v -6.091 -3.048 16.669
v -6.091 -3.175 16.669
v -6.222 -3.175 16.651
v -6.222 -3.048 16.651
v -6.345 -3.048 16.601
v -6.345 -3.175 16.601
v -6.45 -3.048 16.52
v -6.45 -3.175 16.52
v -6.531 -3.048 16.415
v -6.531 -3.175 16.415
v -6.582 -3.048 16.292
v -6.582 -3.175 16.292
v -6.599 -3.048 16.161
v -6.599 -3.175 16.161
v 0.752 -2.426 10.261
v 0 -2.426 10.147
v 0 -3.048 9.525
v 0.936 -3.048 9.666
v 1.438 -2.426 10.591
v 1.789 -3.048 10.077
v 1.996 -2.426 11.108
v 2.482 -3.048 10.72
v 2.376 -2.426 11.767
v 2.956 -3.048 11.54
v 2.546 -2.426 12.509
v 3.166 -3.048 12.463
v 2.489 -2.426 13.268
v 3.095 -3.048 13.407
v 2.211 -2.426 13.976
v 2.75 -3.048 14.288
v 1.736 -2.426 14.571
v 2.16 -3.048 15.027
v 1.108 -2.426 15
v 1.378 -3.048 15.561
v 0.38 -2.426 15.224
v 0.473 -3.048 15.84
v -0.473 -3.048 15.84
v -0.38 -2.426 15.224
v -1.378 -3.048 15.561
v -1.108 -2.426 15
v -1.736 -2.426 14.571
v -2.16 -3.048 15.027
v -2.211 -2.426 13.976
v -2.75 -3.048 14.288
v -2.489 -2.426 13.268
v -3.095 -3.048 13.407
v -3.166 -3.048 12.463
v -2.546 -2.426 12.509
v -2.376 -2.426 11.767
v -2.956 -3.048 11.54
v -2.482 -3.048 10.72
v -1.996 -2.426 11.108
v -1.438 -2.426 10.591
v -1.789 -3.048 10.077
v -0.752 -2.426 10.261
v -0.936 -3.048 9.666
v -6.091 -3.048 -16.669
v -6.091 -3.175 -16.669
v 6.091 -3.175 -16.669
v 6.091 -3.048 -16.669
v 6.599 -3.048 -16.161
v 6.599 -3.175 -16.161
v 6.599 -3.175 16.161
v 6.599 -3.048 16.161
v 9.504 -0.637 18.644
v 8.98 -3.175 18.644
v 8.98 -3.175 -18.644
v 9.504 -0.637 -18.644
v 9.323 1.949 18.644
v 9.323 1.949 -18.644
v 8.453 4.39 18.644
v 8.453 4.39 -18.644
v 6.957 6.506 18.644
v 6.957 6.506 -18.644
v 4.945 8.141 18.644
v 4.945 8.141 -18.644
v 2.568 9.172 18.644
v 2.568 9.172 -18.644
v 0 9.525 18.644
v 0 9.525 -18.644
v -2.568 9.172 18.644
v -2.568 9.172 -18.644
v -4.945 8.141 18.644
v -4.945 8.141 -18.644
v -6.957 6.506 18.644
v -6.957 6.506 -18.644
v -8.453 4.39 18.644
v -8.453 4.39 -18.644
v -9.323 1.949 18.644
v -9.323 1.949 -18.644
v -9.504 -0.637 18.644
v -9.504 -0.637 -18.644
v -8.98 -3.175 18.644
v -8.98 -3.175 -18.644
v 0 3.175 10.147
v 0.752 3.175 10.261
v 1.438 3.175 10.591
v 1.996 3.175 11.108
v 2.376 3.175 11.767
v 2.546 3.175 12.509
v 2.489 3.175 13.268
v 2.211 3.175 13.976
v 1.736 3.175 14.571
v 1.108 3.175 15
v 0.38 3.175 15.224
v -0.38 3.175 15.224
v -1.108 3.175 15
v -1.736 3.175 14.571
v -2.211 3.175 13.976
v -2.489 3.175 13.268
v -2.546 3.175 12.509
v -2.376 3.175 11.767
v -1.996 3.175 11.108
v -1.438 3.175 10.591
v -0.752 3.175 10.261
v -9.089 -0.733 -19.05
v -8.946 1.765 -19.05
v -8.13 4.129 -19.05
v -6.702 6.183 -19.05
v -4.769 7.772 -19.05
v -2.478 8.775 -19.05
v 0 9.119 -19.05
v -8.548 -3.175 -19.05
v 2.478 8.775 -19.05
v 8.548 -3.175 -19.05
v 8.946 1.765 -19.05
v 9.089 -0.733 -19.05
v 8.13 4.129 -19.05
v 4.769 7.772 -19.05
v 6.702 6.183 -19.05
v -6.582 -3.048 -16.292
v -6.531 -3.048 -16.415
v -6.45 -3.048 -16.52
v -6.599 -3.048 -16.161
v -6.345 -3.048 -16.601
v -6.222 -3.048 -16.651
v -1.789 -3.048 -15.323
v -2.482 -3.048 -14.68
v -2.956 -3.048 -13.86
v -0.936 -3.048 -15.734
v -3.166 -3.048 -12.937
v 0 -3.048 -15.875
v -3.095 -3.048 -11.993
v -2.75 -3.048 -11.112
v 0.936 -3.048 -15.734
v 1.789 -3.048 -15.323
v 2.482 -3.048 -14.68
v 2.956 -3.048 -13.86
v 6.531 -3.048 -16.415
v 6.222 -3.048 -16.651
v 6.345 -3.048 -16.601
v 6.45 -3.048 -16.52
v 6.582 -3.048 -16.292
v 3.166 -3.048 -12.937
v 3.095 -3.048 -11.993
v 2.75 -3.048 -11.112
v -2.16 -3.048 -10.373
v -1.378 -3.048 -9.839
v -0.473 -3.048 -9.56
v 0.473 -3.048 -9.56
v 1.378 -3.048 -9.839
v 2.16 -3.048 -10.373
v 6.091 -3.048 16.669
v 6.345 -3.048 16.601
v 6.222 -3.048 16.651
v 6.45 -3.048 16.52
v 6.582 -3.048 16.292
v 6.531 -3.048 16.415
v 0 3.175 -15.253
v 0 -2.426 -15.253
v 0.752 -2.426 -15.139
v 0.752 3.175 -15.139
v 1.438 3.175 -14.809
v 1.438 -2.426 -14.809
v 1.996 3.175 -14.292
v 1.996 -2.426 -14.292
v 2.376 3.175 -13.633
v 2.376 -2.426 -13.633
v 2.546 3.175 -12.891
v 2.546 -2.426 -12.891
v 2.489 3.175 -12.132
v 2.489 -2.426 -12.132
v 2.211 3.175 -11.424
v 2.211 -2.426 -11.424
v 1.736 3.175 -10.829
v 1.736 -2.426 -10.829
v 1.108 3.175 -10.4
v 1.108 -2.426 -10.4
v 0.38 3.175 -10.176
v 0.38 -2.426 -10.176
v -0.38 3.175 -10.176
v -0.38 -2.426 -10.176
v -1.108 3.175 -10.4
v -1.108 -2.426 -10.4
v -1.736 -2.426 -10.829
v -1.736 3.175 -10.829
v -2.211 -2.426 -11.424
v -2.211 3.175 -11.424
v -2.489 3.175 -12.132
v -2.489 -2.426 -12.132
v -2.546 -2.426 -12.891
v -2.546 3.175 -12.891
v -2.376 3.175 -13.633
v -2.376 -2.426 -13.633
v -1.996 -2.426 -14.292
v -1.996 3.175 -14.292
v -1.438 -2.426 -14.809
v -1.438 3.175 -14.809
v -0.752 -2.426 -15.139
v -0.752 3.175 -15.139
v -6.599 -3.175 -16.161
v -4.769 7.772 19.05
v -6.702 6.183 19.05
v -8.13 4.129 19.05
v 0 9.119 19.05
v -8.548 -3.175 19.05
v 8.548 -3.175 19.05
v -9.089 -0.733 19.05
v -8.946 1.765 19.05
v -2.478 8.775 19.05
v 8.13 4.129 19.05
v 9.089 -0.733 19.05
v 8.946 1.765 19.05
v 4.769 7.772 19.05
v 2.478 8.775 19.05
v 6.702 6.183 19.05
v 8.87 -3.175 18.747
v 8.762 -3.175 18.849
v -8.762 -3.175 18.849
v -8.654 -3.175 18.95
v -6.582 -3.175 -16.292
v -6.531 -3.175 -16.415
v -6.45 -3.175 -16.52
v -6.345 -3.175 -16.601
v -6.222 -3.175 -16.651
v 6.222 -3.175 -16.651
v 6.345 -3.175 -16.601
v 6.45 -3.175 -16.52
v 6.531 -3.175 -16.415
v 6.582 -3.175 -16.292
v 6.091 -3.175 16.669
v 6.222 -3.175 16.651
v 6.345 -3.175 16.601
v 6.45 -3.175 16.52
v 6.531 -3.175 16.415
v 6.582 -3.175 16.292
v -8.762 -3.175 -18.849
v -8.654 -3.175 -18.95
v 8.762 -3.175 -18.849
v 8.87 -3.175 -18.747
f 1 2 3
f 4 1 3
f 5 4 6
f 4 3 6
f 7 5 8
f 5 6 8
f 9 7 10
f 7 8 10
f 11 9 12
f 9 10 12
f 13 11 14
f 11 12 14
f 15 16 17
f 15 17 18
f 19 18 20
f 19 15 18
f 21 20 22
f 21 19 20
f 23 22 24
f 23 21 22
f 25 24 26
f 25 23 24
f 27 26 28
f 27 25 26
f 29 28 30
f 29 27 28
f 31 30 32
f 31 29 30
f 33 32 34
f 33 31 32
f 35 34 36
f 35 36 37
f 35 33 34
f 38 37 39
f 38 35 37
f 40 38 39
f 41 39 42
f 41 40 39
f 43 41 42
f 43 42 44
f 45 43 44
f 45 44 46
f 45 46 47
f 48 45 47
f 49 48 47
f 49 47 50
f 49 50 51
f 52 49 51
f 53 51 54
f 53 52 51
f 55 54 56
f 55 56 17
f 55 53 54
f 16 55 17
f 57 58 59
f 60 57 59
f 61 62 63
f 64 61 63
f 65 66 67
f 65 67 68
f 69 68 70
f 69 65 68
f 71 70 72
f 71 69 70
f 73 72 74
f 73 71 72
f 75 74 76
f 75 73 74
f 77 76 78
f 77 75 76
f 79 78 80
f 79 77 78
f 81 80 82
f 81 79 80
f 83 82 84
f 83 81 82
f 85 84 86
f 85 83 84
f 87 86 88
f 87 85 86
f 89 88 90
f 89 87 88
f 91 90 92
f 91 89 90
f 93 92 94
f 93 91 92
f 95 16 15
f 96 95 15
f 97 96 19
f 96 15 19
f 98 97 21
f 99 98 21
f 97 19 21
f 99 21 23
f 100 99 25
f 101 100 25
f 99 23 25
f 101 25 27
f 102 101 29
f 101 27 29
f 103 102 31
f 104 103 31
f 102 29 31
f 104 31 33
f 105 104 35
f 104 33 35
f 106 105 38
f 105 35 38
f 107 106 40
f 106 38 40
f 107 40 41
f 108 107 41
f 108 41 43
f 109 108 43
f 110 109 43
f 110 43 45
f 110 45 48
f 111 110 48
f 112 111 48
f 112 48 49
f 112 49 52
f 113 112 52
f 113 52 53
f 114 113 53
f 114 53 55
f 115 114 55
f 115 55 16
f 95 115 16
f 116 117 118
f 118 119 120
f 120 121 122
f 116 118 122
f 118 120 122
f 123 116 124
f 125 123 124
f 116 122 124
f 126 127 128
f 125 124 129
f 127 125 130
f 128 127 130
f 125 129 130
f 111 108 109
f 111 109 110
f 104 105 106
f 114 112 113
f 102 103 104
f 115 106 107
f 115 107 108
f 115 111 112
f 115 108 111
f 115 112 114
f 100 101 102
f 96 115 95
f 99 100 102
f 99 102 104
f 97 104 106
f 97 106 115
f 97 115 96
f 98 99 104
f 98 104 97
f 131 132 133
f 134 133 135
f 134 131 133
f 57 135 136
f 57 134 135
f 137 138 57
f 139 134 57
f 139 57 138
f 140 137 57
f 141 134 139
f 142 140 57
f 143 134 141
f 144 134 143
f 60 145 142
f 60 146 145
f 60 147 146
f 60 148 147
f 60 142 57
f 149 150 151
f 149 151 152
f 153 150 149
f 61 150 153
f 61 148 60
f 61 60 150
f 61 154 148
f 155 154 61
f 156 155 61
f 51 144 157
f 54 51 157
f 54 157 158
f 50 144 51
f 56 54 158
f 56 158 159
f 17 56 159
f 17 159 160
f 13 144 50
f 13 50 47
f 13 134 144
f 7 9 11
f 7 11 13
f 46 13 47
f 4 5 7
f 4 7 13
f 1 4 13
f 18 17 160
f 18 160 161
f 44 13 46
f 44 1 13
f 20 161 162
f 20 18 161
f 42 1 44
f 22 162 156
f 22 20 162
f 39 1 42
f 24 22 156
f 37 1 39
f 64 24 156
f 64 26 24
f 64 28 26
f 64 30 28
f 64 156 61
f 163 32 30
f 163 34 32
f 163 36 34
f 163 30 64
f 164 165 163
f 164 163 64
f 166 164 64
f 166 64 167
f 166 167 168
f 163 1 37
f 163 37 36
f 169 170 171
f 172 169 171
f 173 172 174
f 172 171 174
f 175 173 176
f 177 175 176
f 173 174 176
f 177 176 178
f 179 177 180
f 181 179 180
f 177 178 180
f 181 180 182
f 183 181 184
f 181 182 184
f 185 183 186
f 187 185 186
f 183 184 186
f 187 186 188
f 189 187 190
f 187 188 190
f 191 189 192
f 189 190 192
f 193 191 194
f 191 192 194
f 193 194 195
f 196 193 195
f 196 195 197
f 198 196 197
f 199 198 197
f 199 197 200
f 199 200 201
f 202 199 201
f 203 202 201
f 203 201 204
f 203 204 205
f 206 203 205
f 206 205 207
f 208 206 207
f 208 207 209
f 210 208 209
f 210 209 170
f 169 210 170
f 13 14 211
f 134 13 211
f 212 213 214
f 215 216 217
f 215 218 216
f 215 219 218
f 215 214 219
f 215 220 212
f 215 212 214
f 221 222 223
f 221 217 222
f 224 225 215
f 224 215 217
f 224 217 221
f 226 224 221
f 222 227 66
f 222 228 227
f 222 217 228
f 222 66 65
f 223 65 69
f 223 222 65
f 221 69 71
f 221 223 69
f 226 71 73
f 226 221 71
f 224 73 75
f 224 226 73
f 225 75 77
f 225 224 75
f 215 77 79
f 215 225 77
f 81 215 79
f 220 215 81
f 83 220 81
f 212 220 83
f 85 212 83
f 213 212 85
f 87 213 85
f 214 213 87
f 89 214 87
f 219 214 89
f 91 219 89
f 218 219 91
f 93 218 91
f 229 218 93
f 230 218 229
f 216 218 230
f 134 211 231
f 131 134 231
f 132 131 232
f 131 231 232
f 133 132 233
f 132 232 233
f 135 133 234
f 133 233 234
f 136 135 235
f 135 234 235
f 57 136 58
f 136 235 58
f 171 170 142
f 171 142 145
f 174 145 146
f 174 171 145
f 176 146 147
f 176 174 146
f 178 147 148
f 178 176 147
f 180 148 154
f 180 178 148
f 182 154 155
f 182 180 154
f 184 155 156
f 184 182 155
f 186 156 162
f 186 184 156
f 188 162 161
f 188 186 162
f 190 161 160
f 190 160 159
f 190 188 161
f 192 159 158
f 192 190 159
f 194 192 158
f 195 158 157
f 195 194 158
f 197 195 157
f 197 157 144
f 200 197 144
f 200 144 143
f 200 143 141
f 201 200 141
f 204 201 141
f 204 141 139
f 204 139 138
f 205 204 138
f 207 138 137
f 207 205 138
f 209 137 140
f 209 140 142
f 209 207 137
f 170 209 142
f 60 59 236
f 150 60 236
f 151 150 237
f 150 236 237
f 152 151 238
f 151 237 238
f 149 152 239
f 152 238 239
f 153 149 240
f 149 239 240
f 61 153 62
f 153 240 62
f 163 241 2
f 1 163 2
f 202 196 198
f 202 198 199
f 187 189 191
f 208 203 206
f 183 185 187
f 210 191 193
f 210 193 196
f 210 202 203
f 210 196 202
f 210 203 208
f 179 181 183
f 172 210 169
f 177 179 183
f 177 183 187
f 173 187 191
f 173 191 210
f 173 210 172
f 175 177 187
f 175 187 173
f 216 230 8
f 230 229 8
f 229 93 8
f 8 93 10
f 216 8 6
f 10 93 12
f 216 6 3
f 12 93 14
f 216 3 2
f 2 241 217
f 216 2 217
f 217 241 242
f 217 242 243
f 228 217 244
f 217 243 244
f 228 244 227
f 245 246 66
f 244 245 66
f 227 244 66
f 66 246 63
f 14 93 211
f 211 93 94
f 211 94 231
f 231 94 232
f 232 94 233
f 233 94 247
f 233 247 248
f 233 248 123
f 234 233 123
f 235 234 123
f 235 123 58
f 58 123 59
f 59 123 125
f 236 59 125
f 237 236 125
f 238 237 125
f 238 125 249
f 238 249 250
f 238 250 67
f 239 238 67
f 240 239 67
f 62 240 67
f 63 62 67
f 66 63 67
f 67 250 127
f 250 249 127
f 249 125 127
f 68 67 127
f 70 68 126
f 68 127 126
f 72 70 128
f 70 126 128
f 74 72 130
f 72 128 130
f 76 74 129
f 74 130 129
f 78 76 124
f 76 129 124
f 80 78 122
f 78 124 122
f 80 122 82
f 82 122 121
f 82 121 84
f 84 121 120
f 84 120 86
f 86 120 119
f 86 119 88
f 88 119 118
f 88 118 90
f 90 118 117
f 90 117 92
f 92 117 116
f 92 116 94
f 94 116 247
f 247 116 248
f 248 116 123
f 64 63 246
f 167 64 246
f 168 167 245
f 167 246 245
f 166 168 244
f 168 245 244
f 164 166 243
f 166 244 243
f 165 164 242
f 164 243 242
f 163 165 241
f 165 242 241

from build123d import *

# Parameters (mm, degrees)
SKETCH1_R            = 9.525
EXTRUDE1_DEPTH       = 19.05
CHAMFER1_SIZE        = 0.4064
TRUNCATED_DEPTH      = 20.05
TRUNCATED_DEPTH_BACK = 20.05
RECESSED_DEPTH       = 0.127
SKETCH4_R            = 2.5527
THREADED_DEPTH       = 6.35
CHAMFER2_SIZE        = 0.6223


with BuildPart() as part:
    # Sketch1 → Extrude1 (new body, symmetric)
    with BuildSketch(Plane.XY):
        Circle(SKETCH1_R)
    extrude(amount=EXTRUDE1_DEPTH, both=True)

    # Chamfer1
    chamfer1_edges = [part.edges().sort_by_distance(p)[0] for p in [
        (-9.525, 0, -19.05),
        (-9.525, 0, 19.05),
    ]]
    chamfer(chamfer1_edges, length=CHAMFER1_SIZE)

    # Sketch2 → Truncated (cut, two sides)
    with BuildSketch(Plane.XY) as truncated_sk:
        with BuildLine():
            Line((-8.980256121, -3.175), (8.980256121, -3.175))
            ThreePointArc((8.980256121, -3.175), (0, -9.525), (-8.980256121, -3.175))
        make_face()
    extrude(amount=TRUNCATED_DEPTH, mode=Mode.SUBTRACT)
    extrude(truncated_sk.sketch, amount=-TRUNCATED_DEPTH_BACK, mode=Mode.SUBTRACT)

    # Sketch3 → Recessed (cut)
    with BuildSketch(Plane.XZ.offset(3.175)):
        with BuildLine():
            Line((6.091006121, 16.66875), (-6.091006121, 16.66875))
            ThreePointArc((-6.091006121, 16.66875), (-6.450216366, 16.519960245), (-6.599006121, 16.16075))
            Line((-6.599006121, 16.16075), (-6.599006121, -16.16075))
            ThreePointArc((-6.599006121, -16.16075), (-6.450216366, -16.519960245), (-6.091006121, -16.66875))
            Line((-6.091006121, -16.66875), (6.091006121, -16.66875))
            ThreePointArc((6.091006121, -16.66875), (6.450216366, -16.519960245), (6.599006121, -16.16075))
            Line((6.599006121, -16.16075), (6.599006121, 16.16075))
            ThreePointArc((6.599006121, 16.16075), (6.450216366, 16.519960245), (6.091006121, 16.66875))
        make_face()
    extrude(amount=-RECESSED_DEPTH, mode=Mode.SUBTRACT)

    # Sketch4 → Threaded (cut)
    with BuildSketch(Plane.XZ.offset(3.175)):
        with Locations(Location((0, 12.7, 0), (0, 0, 270))):  # turned: the seam where the file's is
            Circle(SKETCH4_R)
        with Locations(Location((0, -12.7, 0), (0, 0, 270))):  # turned: the seam where the file's is
            Circle(SKETCH4_R)
    extrude(amount=-THREADED_DEPTH, mode=Mode.SUBTRACT)

    # Chamfer2
    chamfer2_edges = [part.edges().sort_by_distance(p)[0] for p in [
        (0, -3.048, 15.2527),
        (0, -3.048, -10.1473),
    ]]
    chamfer(chamfer2_edges, length=CHAMFER2_SIZE)


solid = part.part
